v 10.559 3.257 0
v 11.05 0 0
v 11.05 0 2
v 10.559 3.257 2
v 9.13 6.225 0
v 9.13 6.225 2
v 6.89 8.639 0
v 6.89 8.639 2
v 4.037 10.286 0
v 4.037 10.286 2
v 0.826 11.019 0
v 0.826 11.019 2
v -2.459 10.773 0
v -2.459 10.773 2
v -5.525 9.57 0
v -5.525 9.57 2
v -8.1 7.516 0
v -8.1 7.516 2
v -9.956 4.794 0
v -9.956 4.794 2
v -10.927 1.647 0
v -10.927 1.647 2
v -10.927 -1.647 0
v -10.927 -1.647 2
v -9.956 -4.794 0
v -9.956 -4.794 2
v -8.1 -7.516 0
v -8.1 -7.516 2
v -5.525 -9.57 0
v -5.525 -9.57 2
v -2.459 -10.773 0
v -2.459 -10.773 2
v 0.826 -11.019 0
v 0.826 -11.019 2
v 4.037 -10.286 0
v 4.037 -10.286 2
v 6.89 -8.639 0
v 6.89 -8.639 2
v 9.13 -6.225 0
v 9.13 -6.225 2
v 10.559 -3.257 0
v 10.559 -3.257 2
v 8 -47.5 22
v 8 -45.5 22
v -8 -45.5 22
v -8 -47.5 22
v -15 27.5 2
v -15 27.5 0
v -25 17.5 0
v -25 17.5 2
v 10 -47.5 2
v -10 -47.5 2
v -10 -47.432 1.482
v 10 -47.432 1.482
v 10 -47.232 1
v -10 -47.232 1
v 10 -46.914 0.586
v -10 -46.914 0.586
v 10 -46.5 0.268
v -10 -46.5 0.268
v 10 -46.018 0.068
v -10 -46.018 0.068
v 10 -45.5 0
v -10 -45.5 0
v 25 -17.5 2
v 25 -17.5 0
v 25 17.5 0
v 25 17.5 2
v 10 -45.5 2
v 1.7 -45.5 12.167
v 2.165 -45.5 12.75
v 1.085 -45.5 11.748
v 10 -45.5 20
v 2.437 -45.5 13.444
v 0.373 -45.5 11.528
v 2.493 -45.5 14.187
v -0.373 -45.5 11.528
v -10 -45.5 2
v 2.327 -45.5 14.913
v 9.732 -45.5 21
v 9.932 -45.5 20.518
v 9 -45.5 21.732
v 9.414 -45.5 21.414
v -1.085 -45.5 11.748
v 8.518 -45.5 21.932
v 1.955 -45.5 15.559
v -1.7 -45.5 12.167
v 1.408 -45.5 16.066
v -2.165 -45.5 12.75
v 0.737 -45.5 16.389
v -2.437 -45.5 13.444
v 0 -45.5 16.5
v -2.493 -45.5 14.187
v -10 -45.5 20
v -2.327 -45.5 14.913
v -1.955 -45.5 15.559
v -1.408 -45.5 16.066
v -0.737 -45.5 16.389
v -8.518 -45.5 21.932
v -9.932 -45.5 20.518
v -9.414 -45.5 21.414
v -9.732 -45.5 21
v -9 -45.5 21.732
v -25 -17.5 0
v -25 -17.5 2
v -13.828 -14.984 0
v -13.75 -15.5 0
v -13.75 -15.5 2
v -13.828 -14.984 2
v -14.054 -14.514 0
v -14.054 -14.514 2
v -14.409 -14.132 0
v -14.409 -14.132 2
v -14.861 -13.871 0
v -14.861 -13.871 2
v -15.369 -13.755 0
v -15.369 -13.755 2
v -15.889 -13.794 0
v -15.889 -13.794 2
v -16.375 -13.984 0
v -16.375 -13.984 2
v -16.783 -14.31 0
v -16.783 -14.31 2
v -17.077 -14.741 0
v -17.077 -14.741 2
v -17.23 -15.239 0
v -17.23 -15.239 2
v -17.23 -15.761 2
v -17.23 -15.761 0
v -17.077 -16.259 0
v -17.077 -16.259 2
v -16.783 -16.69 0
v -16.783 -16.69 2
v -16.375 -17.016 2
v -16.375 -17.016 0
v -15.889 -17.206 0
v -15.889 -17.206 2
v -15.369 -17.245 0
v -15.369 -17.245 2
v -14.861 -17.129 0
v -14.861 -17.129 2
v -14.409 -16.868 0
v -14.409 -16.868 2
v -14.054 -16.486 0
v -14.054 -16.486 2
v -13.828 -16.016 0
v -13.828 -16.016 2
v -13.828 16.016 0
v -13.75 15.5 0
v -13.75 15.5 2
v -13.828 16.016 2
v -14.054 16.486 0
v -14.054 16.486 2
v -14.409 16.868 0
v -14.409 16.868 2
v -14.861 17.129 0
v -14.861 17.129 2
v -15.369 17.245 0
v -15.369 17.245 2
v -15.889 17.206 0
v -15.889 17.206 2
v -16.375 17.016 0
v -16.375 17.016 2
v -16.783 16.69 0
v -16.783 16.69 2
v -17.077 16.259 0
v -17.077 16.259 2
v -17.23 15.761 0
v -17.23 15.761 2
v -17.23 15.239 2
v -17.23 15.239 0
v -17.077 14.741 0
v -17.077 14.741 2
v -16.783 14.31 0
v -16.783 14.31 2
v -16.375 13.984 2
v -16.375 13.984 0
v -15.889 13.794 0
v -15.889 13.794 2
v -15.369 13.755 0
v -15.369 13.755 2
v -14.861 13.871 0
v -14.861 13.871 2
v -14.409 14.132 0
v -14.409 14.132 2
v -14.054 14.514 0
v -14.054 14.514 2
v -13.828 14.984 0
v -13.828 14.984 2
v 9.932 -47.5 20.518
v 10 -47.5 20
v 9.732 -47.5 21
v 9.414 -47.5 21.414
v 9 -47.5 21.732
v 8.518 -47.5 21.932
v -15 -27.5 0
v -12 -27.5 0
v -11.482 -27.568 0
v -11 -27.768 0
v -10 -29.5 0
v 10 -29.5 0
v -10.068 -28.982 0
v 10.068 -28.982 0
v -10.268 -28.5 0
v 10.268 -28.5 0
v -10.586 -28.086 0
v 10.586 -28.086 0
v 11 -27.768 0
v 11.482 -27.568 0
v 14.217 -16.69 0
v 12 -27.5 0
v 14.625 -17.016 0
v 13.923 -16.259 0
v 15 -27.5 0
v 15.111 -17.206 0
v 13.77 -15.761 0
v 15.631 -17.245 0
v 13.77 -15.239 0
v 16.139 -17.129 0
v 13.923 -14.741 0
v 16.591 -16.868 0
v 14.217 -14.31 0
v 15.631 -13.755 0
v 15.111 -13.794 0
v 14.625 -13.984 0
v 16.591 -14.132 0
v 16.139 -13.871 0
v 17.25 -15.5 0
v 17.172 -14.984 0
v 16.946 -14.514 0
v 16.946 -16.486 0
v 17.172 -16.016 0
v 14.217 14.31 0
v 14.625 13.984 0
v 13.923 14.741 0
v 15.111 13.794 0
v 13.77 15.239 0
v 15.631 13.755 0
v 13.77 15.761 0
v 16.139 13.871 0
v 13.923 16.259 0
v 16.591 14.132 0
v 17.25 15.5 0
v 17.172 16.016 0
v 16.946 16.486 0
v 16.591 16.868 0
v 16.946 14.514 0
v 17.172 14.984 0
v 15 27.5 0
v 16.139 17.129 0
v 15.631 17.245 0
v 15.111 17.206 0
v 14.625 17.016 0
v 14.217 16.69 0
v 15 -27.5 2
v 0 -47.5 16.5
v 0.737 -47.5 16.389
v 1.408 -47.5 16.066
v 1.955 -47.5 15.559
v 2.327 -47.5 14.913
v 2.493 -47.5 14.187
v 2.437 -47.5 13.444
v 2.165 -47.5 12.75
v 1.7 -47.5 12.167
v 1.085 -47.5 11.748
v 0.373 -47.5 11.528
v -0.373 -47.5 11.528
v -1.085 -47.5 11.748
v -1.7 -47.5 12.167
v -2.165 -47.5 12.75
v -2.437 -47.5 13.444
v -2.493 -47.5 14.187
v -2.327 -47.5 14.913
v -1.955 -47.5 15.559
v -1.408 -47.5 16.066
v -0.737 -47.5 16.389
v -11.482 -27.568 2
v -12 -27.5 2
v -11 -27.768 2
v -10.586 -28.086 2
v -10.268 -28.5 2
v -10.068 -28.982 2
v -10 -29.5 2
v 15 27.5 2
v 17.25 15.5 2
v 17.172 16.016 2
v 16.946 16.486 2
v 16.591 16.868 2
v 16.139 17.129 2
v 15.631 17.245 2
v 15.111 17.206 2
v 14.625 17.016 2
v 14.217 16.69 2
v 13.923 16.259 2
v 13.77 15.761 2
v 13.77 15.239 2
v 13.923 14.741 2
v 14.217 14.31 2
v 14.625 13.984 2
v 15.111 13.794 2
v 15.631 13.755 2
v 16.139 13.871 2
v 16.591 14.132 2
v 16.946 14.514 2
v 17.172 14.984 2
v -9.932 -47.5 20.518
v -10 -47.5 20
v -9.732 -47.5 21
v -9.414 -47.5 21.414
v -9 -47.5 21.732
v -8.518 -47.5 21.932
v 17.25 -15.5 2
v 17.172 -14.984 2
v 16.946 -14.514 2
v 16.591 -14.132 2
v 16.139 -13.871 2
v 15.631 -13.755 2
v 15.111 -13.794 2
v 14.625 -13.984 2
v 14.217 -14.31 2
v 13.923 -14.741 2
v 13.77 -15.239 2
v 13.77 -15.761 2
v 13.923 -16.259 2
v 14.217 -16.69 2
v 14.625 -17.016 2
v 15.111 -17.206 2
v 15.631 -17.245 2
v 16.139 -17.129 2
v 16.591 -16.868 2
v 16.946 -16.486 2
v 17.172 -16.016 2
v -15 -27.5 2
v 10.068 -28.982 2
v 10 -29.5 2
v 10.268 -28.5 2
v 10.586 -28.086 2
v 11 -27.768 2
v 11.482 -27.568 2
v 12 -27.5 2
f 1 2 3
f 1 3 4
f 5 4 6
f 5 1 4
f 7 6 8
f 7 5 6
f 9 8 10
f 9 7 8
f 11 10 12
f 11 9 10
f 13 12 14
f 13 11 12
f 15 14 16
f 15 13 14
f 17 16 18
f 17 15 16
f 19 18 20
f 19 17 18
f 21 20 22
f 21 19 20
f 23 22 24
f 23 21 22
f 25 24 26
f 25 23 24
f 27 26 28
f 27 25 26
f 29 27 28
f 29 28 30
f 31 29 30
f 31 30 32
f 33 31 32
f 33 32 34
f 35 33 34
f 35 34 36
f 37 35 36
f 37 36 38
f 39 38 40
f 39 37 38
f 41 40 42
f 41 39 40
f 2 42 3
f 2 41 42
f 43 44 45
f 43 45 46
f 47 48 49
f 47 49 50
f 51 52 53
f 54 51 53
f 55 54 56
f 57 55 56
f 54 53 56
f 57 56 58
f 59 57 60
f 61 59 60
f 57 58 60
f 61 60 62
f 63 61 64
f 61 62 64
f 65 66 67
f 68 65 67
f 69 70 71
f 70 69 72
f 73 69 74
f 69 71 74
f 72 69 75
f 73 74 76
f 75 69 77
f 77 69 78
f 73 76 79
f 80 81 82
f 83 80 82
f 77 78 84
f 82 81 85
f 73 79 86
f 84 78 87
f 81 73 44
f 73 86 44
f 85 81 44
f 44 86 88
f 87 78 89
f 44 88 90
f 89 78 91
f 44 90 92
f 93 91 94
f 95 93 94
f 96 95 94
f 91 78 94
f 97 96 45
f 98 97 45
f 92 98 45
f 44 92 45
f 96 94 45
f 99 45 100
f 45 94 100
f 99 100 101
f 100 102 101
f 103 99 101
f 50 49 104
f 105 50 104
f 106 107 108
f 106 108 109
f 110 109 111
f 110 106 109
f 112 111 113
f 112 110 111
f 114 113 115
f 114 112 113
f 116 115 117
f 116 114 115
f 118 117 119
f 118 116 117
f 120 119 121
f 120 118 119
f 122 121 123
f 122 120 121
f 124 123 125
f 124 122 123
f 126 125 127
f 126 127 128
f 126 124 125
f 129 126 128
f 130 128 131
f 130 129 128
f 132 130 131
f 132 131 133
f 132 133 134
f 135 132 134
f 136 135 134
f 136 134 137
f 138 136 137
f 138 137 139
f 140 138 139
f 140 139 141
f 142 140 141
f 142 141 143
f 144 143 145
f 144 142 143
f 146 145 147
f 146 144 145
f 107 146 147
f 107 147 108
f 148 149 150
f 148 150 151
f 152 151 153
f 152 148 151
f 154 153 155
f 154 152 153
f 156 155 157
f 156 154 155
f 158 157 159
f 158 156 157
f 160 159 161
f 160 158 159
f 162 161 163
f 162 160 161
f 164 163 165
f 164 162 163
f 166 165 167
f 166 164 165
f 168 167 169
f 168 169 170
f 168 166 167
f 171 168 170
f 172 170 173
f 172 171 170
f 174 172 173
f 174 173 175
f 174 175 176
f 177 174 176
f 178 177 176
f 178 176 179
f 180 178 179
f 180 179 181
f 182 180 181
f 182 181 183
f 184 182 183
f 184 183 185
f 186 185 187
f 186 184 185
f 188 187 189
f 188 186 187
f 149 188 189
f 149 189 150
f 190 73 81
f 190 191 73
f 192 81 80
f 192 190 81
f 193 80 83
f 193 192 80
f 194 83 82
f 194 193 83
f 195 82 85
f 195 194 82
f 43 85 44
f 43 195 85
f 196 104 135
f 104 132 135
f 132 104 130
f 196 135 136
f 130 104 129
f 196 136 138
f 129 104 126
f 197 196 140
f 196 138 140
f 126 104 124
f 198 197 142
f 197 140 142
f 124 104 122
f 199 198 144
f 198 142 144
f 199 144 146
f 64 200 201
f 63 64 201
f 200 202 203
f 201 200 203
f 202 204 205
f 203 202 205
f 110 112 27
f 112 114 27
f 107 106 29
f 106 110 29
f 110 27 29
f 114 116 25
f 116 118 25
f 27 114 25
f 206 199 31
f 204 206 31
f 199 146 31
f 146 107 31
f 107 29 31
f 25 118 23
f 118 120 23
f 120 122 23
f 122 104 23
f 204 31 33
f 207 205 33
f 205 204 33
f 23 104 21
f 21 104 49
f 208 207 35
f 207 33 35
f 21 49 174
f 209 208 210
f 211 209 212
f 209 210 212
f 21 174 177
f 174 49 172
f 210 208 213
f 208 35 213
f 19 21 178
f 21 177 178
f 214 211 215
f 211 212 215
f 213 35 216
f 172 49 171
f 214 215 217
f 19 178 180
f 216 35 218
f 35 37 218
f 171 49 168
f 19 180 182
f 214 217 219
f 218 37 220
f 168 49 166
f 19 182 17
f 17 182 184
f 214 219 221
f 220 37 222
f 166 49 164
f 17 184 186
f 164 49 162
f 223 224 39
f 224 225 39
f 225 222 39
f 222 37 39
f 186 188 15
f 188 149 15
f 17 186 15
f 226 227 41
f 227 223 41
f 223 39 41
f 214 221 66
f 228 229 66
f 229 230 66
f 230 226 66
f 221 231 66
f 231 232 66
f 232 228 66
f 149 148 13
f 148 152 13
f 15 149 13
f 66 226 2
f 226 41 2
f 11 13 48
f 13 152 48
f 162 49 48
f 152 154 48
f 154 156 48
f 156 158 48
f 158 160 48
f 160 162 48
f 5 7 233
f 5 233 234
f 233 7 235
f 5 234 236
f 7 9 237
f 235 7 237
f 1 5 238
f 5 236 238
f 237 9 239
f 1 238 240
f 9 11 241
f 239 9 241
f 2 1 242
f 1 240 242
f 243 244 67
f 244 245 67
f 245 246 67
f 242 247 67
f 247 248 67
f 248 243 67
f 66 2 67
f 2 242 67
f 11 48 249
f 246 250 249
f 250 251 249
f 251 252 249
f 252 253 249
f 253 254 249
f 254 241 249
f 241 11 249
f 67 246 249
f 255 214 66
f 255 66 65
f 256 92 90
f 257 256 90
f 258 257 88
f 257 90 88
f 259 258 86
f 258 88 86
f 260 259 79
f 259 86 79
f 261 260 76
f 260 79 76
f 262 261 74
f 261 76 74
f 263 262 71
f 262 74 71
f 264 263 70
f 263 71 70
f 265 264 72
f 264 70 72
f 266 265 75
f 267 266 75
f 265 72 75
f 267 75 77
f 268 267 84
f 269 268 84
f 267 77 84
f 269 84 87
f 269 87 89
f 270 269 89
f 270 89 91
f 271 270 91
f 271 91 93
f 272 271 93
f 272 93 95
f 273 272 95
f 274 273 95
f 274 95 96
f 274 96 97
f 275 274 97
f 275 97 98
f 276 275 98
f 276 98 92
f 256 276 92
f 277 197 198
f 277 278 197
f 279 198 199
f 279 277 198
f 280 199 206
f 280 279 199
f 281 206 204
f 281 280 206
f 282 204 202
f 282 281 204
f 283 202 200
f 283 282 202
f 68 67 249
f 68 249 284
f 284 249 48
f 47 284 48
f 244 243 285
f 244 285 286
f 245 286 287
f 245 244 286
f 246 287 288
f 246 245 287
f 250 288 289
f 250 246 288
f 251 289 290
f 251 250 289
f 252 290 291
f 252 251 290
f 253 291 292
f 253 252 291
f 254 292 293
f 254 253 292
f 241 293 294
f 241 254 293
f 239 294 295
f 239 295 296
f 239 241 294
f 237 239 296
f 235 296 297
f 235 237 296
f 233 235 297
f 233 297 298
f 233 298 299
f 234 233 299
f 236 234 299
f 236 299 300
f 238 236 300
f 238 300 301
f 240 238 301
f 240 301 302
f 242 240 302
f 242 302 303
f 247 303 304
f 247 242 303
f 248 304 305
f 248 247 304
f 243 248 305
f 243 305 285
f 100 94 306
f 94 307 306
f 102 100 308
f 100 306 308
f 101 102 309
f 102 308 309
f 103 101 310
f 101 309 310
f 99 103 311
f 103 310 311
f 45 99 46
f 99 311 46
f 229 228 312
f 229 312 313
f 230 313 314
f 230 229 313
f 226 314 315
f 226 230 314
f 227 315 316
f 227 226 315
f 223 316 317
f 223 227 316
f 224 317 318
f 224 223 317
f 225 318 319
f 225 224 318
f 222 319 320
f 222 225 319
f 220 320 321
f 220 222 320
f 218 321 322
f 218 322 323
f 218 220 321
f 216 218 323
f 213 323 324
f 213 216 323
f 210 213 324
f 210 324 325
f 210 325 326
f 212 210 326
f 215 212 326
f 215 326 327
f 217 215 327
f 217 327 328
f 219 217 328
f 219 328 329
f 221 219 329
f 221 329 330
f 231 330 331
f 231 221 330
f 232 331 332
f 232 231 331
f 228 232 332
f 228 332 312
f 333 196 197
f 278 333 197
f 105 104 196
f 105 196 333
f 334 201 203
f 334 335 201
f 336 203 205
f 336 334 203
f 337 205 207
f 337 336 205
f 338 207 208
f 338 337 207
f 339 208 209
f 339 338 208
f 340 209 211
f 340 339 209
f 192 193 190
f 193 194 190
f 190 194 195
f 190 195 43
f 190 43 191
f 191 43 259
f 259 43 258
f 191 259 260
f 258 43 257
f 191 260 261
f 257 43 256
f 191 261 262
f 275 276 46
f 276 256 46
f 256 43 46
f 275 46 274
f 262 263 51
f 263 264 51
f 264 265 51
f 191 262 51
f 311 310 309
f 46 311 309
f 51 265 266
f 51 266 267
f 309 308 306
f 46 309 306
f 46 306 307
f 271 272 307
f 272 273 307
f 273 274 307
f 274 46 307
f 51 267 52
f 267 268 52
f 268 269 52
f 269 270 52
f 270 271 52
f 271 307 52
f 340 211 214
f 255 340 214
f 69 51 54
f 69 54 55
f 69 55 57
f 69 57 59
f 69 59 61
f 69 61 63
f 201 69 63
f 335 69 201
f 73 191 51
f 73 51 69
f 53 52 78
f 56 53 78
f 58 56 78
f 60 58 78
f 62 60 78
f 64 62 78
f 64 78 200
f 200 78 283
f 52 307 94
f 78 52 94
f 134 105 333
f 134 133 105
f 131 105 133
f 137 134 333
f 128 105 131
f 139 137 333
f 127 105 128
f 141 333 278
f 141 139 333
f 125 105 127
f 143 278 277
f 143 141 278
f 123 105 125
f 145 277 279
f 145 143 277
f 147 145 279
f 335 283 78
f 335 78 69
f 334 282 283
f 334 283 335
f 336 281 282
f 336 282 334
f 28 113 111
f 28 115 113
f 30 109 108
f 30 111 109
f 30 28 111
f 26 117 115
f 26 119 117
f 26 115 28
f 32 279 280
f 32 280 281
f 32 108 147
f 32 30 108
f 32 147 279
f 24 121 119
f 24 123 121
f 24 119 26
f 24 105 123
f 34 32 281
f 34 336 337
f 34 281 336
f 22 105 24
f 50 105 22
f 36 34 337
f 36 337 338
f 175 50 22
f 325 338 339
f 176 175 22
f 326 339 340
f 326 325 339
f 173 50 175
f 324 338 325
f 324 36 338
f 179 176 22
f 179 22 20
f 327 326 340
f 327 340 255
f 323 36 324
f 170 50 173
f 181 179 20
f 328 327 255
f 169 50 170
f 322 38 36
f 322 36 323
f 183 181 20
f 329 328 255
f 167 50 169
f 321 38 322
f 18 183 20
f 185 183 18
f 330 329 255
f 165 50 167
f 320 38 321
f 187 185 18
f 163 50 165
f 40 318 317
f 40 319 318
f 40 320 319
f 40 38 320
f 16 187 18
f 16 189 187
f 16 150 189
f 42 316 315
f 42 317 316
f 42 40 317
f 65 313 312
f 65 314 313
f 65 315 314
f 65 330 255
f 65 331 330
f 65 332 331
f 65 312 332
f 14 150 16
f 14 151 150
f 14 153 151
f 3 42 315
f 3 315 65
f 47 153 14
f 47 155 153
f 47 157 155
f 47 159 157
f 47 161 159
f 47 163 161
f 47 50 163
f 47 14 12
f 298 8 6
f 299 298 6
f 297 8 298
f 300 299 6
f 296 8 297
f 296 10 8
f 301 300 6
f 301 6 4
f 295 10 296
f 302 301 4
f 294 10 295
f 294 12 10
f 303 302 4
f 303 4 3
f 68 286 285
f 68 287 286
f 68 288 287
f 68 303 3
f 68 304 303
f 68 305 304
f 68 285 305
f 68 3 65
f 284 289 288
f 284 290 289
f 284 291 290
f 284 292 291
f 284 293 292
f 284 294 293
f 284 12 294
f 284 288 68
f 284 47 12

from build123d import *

# Parameters (mm, degrees)
SCHIZZO1_R                   = 1.75
SCHIZZO1_R_2                 = 11.05
ESTRUSIONE_ESTRUSIONE1_DEPTH = 2
SCHIZZO14_W                  = 20
SCHIZZO14_H                  = 2
ESTRUSIONE_ESTRUSIONE2_DEPTH = 22
SCHIZZO15_R                  = 2.5
TAGLIO_ESTRUSIONE1_DEPTH     = 10
SMUSSO1_SIZE                 = 10
RACCORDO1_R                  = 2
CONVERTI_SOLIDO2_START       = -49.5
CONVERTI_SOLIDO2_OUTLINE_R   = 2.5
CONVERTI_SOLIDO2_DEPTH       = 4
BORDO_FLANGIA1_START         = -10
BORDO_FLANGIA1_DEPTH         = 20
SCHIZZO27_R                  = 2.5
TAGLIO_ESTRUSIONE2_DEPTH     = 10
RACCORDO3_R                  = 2


# Read off the part's stored shape, not the designer's step: Converti-Solido2, Bordo-Flangia1
with BuildPart() as part:
    # Schizzo1 → Estrusione-Estrusione1 (new body)
    with BuildSketch(Plane.XY):
        Polygon((-25, -27.5), (-10, -27.5), (-10, -49.5), (10, -49.5), (10, -27.5), (25, -27.5), (25, 27.5), (-25, 27.5), align=None)
        with Locations((-15.5, 15.5)):
            Circle(SCHIZZO1_R, mode=Mode.SUBTRACT)
        with Locations((15.5, 15.5)):
            Circle(SCHIZZO1_R, mode=Mode.SUBTRACT)
        with Locations((15.5, -15.5)):
            Circle(SCHIZZO1_R, mode=Mode.SUBTRACT)
        with Locations((-15.5, -15.5)):
            Circle(SCHIZZO1_R, mode=Mode.SUBTRACT)
        Circle(SCHIZZO1_R_2, mode=Mode.SUBTRACT)
    extrude(amount=ESTRUSIONE_ESTRUSIONE1_DEPTH)

    # Schizzo14 → Estrusione-Estrusione2 (add)
    with BuildSketch(Plane.XY.offset(2)):
        with Locations((0, -48.5)):
            Rectangle(SCHIZZO14_W, SCHIZZO14_H)
    extrude(amount=ESTRUSIONE_ESTRUSIONE2_DEPTH)

    # Schizzo15 → Taglio-Estrusione1 (cut)
    with BuildSketch(Plane(origin=(0, -47.5, 0), x_dir=(1, 0, 0), z_dir=(0, 1, 0))):
        with Locations(Location((0, -14, 0), (0, 0, 270))):
            Circle(SCHIZZO15_R)
    extrude(amount=-TAGLIO_ESTRUSIONE1_DEPTH, mode=Mode.SUBTRACT)

    # Smusso1
    smusso1_edges = [part.edges().sort_by_distance(p)[0] for p in [
        (25, -27.5, 1),
        (-25, -27.5, 1),
        (-25, 27.5, 1),
        (25, 27.5, 1),
    ]]
    chamfer(smusso1_edges, length=SMUSSO1_SIZE)

    # Raccordo1
    raccordo1_edges = [part.edges().sort_by_distance(p)[0] for p in [
        (10, -27.5, 1),
        (-10, -27.5, 1),
        (0, -47.5, 2),
        (-10, -48.5, 24),
        (10, -48.5, 24),
        (0, -49.5, 0),
    ]]
    fillet(raccordo1_edges, radius=RACCORDO1_R)

    # Converti-Solido2 outline → Converti-Solido2 (cut)
    with BuildSketch(Plane(origin=(0, 0, 0), x_dir=(1, 0, 0), z_dir=(0, 1, 0)).offset(CONVERTI_SOLIDO2_START)):
        with BuildLine():
            Line((-10, 0), (-10, -22))
            ThreePointArc((-10, -22), (-9.414213562, -23.414213562), (-8, -24))
            Line((-8, -24), (8, -24))
            ThreePointArc((8, -24), (9.414213562, -23.414213562), (10, -22))
            Line((10, -22), (10, 0))
            Line((10, 0), (-10, 0))
        make_face()
        with Locations((0, -14)):
            Circle(CONVERTI_SOLIDO2_OUTLINE_R, mode=Mode.SUBTRACT)
    extrude(amount=CONVERTI_SOLIDO2_DEPTH, mode=Mode.SUBTRACT)

    # Bordo-Flangia1 outline → Bordo-Flangia1 (add)
    with BuildSketch(Plane.YZ.offset(BORDO_FLANGIA1_START)):
        with BuildLine():
            ThreePointArc((-47.5, 2), (-46.914213562, 0.585786438), (-45.5, 0))
            Line((-45.5, 0), (-45.5, 22))
            Line((-45.5, 22), (-47.5, 22))
            Line((-47.5, 22), (-47.5, 2))
        make_face()
    extrude(amount=BORDO_FLANGIA1_DEPTH)

    # Schizzo27 → Taglio-Estrusione2 (cut)
    with BuildSketch(Plane(origin=(0, -45.5, 0), x_dir=(1, 0, 0), z_dir=(0, 1, 0))):
        with Locations(Location((0, -14, 0), (0, 0, 270))):
            Circle(SCHIZZO27_R)
    extrude(amount=-TAGLIO_ESTRUSIONE2_DEPTH, mode=Mode.SUBTRACT)

    # Raccordo3
    raccordo3_edges = [part.edges().sort_by_distance(p)[0] for p in [
        (10, -46.5, 22),
        (-10, -46.5, 22),
    ]]
    fillet(raccordo3_edges, radius=RACCORDO3_R)


solid = part.part
